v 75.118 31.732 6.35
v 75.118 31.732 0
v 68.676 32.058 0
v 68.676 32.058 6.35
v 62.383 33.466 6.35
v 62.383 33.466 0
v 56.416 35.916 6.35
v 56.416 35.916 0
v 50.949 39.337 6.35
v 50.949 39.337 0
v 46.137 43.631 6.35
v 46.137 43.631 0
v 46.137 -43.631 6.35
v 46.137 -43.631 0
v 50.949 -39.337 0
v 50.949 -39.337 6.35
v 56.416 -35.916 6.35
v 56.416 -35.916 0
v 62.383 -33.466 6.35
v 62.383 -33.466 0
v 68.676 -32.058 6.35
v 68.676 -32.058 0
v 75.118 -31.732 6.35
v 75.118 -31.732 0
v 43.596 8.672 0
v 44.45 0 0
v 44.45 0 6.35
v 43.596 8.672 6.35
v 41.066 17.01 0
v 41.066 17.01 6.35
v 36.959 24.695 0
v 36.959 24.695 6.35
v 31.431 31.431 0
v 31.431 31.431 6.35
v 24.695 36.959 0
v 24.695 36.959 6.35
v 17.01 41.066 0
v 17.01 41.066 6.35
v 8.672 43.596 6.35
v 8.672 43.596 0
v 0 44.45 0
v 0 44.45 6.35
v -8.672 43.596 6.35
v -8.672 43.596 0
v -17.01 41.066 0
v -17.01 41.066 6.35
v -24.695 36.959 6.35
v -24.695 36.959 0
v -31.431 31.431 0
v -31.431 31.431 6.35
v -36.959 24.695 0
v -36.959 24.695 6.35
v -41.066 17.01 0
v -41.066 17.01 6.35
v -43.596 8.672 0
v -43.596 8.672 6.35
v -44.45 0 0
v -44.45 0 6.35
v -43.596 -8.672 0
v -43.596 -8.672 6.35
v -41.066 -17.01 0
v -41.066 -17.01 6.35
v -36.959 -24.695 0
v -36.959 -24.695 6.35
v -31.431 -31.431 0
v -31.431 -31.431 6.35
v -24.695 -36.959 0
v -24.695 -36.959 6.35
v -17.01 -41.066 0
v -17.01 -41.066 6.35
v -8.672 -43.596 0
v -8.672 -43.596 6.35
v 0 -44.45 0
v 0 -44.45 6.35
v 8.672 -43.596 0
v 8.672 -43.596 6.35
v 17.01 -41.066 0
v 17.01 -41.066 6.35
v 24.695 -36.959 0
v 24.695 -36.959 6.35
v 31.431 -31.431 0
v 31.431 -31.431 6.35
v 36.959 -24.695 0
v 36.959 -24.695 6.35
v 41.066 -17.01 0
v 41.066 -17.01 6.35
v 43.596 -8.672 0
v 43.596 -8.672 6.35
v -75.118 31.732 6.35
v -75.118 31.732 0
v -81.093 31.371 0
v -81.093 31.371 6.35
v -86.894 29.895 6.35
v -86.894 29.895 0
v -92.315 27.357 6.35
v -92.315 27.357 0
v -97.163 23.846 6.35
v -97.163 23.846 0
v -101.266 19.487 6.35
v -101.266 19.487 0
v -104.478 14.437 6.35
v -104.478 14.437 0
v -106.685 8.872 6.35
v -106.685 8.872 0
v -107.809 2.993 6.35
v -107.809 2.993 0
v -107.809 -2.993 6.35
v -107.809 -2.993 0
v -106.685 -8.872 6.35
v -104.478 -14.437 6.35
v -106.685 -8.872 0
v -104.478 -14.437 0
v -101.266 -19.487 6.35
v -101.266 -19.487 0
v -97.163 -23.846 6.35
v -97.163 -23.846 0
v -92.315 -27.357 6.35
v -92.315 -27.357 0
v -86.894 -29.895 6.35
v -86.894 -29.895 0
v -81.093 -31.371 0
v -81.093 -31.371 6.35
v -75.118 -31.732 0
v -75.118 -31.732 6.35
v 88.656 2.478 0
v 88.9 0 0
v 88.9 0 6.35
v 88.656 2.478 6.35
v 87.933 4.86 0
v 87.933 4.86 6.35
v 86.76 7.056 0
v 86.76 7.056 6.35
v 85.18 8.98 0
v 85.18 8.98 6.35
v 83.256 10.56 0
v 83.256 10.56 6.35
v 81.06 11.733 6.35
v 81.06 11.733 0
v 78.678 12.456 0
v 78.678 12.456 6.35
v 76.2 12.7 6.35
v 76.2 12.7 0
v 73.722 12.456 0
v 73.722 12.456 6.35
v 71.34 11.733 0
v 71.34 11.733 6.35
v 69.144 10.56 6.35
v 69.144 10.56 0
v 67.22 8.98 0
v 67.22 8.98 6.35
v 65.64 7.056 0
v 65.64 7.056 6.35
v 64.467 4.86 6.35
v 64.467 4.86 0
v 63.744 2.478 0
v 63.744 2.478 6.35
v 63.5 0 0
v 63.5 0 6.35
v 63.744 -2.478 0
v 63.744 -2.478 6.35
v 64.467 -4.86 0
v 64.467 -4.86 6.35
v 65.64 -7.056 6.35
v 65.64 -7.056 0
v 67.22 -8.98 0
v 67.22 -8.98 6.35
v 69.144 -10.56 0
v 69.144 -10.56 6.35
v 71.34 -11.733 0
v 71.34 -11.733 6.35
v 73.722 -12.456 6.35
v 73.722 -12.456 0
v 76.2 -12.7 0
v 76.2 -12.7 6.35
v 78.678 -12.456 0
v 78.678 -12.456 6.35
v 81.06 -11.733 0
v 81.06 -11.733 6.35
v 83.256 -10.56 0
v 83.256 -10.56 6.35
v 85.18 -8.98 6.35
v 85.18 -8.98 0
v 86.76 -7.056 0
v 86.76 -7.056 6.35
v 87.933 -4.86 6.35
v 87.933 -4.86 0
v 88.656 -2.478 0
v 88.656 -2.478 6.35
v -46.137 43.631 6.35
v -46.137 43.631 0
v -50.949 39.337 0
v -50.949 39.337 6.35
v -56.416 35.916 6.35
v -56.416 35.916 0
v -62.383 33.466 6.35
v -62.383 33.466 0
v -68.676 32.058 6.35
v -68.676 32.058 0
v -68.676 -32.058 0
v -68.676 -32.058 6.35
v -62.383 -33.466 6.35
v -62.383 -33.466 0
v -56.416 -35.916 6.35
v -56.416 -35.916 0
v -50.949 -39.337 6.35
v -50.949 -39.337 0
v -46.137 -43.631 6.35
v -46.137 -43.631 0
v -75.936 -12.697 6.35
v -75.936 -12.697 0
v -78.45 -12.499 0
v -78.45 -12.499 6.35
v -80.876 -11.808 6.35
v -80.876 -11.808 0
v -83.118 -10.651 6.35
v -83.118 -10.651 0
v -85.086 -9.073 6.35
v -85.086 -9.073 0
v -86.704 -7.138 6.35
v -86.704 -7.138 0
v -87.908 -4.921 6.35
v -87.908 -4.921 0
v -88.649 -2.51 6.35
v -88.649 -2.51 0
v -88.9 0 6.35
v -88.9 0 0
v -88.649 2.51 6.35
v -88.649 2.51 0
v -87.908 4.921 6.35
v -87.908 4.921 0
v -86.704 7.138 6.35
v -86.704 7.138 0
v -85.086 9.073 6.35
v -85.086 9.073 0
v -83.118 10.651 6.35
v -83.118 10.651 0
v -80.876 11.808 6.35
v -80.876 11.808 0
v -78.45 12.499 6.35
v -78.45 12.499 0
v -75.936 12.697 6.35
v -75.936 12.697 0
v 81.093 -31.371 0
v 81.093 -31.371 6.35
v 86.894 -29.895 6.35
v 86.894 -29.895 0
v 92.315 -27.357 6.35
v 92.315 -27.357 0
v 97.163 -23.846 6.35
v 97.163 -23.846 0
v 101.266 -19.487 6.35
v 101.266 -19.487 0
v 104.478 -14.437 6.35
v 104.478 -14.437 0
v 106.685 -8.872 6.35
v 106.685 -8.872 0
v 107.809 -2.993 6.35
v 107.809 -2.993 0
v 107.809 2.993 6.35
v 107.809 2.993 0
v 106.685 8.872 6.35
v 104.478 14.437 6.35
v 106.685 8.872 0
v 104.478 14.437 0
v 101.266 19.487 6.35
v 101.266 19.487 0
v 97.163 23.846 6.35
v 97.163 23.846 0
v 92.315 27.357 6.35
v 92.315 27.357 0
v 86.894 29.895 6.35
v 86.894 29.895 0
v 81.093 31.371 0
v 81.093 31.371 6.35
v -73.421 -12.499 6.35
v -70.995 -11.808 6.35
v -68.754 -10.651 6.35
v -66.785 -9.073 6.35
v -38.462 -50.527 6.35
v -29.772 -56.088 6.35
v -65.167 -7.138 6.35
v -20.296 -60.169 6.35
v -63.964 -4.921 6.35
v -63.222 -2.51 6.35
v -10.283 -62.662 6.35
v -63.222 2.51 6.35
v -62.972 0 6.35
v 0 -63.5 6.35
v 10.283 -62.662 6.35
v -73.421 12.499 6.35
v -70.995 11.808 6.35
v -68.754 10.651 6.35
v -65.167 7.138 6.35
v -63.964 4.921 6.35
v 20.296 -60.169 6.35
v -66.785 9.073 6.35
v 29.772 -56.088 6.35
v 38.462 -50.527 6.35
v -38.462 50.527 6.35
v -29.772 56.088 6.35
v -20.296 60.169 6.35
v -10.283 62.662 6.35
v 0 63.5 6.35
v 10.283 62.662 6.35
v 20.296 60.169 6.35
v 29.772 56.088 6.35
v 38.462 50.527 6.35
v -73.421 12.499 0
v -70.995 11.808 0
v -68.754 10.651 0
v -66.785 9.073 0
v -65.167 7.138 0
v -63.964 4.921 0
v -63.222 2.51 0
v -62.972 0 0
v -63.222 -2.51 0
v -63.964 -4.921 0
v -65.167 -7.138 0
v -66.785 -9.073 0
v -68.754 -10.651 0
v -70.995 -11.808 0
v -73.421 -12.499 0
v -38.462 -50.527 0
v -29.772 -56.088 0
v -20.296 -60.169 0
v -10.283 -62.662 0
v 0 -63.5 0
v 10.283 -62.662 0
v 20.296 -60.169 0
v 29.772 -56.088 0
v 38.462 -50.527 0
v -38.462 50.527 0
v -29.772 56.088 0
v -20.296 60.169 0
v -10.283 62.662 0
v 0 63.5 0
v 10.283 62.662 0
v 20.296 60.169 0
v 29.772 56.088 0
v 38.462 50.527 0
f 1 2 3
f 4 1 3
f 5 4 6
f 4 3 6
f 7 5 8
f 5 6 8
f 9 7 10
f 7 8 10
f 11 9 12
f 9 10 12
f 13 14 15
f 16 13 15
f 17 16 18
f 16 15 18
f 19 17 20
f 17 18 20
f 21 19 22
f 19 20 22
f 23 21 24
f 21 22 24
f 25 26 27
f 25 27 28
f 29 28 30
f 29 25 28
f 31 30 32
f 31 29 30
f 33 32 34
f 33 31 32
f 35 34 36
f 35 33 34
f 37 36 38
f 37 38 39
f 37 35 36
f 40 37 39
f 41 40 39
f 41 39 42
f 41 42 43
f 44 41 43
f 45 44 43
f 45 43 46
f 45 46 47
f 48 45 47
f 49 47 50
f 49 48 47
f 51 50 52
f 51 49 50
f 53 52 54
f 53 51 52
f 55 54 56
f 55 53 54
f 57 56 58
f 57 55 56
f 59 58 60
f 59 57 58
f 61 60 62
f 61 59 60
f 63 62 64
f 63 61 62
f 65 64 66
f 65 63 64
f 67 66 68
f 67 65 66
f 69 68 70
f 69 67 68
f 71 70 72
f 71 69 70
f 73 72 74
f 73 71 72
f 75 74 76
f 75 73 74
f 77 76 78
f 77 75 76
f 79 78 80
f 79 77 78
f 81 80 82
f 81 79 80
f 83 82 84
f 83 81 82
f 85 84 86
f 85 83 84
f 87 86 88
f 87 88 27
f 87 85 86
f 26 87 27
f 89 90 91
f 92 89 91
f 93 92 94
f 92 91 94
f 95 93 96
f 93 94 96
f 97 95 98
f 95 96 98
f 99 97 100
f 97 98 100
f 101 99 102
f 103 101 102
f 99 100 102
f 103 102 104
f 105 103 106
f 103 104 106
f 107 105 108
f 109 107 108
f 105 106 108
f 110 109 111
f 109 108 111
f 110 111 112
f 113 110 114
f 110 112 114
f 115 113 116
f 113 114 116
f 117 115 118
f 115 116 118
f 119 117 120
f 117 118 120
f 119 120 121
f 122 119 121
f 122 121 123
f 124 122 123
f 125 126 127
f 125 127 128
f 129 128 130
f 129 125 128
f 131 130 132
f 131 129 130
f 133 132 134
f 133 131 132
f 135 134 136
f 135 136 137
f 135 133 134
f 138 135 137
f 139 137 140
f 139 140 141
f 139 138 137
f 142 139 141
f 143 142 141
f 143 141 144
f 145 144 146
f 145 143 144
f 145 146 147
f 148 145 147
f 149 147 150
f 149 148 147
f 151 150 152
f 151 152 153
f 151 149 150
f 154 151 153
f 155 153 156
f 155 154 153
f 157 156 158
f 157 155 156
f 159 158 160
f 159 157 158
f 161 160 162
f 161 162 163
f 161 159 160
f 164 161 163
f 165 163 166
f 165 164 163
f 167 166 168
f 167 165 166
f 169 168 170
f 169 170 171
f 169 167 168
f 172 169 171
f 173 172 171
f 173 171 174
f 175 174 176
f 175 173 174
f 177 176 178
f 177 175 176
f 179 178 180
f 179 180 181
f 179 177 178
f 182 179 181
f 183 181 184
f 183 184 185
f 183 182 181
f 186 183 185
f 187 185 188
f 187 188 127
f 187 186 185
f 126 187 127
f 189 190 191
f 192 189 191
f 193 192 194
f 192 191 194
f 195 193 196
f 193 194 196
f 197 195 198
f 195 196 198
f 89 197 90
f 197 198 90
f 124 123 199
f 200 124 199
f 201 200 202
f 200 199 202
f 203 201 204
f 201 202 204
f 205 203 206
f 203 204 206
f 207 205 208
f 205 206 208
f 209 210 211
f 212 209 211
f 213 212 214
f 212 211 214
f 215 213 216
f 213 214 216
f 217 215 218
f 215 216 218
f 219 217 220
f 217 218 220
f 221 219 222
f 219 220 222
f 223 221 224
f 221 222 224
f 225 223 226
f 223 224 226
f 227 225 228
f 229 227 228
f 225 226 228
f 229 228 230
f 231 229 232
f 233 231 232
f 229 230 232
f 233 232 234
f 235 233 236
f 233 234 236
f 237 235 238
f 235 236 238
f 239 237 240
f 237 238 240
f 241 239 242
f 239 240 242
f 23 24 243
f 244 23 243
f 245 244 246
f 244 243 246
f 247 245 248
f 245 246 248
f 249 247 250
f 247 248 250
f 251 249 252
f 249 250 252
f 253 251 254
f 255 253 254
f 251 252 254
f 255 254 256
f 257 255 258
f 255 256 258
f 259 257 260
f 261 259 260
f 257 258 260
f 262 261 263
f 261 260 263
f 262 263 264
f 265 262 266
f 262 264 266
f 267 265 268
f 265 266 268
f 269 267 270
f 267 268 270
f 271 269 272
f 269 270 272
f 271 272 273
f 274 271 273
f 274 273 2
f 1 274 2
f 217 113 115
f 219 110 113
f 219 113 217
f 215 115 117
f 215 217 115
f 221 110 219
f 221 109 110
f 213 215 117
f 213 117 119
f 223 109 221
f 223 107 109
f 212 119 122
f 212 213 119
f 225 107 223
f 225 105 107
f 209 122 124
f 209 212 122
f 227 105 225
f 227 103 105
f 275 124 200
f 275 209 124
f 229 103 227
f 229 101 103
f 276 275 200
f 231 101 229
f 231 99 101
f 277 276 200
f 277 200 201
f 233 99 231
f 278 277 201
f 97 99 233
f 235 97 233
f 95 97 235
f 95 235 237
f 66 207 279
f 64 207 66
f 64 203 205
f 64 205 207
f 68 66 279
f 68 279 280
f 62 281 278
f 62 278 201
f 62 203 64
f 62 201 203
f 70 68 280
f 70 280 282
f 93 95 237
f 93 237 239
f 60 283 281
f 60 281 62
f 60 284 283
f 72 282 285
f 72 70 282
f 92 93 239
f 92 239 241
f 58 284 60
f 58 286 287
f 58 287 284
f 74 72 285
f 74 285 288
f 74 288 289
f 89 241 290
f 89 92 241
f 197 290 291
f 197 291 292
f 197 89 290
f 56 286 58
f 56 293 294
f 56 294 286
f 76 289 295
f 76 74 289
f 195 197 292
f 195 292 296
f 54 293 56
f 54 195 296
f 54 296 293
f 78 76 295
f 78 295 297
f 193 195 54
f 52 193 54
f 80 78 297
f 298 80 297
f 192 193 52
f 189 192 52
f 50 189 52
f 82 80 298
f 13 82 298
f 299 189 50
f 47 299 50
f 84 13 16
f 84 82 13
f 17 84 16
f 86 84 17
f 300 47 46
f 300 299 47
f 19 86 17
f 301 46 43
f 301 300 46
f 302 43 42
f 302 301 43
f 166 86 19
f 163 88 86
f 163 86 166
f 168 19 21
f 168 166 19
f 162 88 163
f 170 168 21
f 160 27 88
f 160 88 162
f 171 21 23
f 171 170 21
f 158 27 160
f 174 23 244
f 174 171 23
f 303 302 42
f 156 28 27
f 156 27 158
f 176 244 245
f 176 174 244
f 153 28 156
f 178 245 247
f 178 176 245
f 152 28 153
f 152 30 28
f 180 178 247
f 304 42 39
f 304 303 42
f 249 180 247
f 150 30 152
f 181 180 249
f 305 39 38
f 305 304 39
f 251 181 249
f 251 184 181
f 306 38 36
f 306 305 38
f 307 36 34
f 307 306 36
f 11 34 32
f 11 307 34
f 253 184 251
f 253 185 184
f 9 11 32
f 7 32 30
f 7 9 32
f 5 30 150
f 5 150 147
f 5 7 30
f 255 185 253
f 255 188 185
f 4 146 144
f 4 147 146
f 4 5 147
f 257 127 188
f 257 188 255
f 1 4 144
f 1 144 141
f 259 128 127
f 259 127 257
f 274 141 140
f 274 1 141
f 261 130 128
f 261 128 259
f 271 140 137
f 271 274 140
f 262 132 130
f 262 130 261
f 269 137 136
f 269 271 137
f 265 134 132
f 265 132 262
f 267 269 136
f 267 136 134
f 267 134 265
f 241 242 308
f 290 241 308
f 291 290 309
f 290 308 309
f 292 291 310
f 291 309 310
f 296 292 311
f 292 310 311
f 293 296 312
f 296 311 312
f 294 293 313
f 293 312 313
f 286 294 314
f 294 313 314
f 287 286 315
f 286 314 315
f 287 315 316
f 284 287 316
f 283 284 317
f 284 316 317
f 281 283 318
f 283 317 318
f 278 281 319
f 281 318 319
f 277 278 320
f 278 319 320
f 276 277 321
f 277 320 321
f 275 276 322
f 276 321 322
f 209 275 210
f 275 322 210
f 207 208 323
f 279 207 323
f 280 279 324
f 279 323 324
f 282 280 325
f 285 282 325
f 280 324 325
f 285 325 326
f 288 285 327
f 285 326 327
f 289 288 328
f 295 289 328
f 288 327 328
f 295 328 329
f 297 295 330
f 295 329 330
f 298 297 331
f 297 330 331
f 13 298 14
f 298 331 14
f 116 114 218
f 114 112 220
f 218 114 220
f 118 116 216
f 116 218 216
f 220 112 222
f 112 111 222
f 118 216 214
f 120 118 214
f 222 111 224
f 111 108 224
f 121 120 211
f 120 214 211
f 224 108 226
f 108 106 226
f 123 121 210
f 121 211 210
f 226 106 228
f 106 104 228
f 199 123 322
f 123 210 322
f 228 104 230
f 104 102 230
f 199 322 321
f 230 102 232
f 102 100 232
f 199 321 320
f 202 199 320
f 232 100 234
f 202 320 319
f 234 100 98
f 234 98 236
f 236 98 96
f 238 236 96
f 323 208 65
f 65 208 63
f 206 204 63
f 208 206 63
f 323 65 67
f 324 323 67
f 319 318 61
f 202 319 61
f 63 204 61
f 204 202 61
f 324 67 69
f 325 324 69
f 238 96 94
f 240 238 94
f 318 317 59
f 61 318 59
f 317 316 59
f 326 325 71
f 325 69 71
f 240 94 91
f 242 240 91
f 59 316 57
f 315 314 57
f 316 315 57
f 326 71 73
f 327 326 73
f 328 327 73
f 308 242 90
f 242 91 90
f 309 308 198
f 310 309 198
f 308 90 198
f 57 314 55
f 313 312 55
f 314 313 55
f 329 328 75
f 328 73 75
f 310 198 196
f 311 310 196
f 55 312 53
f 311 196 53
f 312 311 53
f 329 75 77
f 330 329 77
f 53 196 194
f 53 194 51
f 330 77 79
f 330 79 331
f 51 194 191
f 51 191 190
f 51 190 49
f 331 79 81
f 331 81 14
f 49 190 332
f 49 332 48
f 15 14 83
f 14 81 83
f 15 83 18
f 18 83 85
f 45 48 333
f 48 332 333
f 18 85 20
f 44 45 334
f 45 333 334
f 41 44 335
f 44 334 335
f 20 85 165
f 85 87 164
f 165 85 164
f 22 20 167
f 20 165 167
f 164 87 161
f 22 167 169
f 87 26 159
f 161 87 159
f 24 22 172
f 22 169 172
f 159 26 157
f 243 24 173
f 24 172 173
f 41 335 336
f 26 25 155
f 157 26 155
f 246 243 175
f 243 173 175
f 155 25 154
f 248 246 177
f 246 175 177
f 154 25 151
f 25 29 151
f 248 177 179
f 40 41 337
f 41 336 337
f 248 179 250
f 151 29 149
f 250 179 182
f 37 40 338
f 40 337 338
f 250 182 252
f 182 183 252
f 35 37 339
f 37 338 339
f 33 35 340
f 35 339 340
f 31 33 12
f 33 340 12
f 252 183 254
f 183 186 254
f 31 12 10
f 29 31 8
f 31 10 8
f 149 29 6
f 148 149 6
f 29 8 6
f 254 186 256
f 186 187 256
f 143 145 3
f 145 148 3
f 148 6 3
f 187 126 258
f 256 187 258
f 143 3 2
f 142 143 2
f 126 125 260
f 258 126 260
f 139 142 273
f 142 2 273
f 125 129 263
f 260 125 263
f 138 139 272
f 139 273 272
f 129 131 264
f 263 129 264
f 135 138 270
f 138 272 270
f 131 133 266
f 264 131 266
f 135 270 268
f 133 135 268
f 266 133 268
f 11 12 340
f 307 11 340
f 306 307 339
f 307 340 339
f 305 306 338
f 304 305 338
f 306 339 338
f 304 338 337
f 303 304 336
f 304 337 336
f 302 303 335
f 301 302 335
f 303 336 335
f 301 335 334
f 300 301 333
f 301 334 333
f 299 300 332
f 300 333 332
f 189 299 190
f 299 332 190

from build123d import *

# Parameters (mm, degrees)
F0_R     = 44.45
F0_R_2   = 12.7
F2_DEPTH = 6.35


# Not quite as in the source:
# - a feature of the source that left no trace in its solid (it failed there, or was rolled back) is left out


with BuildPart() as f2:
    # F0 (on Top) → F2 (new body)
    with BuildSketch(Plane.XY):
        with BuildLine():
            ThreePointArc((46.13671875, -43.6308741946), (59.3475236203, -34.5646316236), (75.1176136364, -31.7315448688))
            ThreePointArc((75.1176136364, -31.7315448688), (107.95, 0), (75.1176136364, 31.7315448688))
            ThreePointArc((75.1176136364, 31.7315448688), (59.3475236203, 34.5646316236), (46.13671875, 43.6308741946))
            ThreePointArc((46.13671875, 43.6308741946), (0, 63.5), (-46.13671875, 43.6308741946))
            ThreePointArc((-46.13671875, 43.6308741946), (-59.3475236203, 34.5646316236), (-75.1176136364, 31.7315448688))
            ThreePointArc((-75.1176136364, 31.7315448688), (-107.95, 0), (-75.1176136364, -31.7315448688))
            ThreePointArc((-75.1176136364, -31.7315448688), (-59.3475236203, -34.5646316236), (-46.13671875, -43.6308741946))
            ThreePointArc((-46.13671875, -43.6308741946), (0, -63.5), (46.13671875, -43.6308741946))
        make_face()
        with BuildLine():
            ThreePointArc((-75.9357507288, 12.6972505812), (-66.7851626656, 9.0732013574), (-62.9715014577, 0))
            ThreePointArc((-62.9715014577, 0), (-66.7851626656, -9.0732013574), (-75.9357507288, -12.6972505812))
            ThreePointArc((-75.9357507288, -12.6972505812), (-88.9, 0), (-75.9357507288, 12.6972505812))
        make_face(mode=Mode.SUBTRACT)
        Circle(F0_R, mode=Mode.SUBTRACT)
        with Locations((76.2, 0)):
            Circle(F0_R_2, mode=Mode.SUBTRACT)
    extrude(amount=F2_DEPTH)


solid = f2.part
